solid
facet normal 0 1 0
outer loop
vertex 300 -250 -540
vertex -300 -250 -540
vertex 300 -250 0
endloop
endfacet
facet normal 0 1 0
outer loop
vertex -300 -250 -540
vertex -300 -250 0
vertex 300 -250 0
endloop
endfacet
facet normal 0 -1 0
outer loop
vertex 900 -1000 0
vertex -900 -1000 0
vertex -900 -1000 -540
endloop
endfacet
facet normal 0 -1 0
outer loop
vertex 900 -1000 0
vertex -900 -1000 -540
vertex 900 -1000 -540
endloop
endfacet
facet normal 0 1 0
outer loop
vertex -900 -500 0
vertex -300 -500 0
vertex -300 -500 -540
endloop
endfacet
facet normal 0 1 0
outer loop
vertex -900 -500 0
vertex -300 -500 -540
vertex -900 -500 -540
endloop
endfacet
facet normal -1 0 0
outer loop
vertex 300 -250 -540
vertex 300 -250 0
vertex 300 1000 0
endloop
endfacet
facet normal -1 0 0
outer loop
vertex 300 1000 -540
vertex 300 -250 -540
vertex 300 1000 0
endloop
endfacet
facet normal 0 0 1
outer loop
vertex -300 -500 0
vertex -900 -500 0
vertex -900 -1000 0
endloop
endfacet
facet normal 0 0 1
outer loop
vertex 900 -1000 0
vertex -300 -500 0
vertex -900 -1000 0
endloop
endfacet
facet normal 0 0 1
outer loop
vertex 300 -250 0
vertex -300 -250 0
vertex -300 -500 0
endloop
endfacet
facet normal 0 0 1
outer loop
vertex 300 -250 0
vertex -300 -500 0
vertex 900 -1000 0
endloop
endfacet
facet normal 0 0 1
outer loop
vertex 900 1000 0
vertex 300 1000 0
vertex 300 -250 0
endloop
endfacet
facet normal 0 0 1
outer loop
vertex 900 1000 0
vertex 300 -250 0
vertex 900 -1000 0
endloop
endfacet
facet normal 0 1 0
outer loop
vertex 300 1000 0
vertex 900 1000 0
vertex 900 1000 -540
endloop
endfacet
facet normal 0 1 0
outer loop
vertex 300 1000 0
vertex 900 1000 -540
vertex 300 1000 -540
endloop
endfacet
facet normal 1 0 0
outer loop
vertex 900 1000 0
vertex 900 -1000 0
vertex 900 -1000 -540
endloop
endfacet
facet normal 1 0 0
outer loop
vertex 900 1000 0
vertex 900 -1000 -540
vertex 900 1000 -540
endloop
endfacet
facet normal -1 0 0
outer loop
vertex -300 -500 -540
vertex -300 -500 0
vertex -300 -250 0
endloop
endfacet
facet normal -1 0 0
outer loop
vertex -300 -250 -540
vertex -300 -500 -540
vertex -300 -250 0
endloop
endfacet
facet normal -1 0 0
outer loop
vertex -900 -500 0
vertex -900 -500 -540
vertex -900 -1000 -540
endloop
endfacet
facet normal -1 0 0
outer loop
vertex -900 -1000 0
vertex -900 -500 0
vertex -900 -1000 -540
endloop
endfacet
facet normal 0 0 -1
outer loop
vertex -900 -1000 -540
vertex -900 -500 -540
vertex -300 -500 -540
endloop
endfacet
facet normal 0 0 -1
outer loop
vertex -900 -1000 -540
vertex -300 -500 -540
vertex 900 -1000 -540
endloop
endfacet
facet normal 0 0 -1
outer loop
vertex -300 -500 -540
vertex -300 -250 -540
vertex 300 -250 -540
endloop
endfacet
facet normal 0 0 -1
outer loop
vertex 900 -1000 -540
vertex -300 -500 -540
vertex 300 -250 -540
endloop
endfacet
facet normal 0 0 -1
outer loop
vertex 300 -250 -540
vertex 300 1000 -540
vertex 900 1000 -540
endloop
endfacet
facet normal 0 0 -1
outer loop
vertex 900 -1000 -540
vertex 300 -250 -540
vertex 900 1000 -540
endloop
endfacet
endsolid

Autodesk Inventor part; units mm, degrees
ref_plane "YZ Plane" through (0, 0, 0) normal (1, 0, 0) x (0, 1, 0)
ref_plane "XZ Plane" through (0, 0, 0) normal (0, 1, 0) x (-1, 0, 0)
ref_plane "XY Plane" through (0, 0, 0) normal (0, 0, 1) x (1, 0, 0)
sketch "Sketch1" plane through (0, 0, 0) normal (0, 0, 1) x (1, 0, 0)
  line L0 (-900, -1000) -> (900, -1000)
  line L1 (900, -1000) -> (900, 1000)
  line L2 (900, 1000) -> (-900, 1000)
  line L3 (-900, 1000) -> (-900, -1000)
  line L4 (-900, -1000) -> (900, 1000) construction
  line L5 (900, -1000) -> (-900, 1000) construction
  point P0 (0, 0)
  dimension "d0" = 1000
  dimension "d1" = 900
extrude "Extrusion1" add sketch "Sketch1" against normal blind 540
sketch "Sketch2" plane through (0, 0, 0) normal (0, 0, 1) x (1, 0, 0)
  line L0 (-900, -1000) -> (900, -1000) projected
  line L1 (900, -1000) -> (900, 1000) projected
  line L2 (900, 1000) -> (-900, 1000) projected
  line L3 (-900, 1000) -> (-900, -1000) projected
  line L4 (900, -1000) -> (-900, -1000) projected
  line L5 (-900, -1000) -> (-900, -500)
  line L6 (-900, -1000) -> (-900, 1000) projected
  line L7 (-300, -500) -> (-300, -250)
  line L8 (-300, -250) -> (300, -250)
  line L9 (300, -250) -> (300, 1000)
  line L10 (-900, 1000) -> (-900, -500)
  line L11 (-300, -500) -> (-900, -500)
  point P0 (0, 0)
  point P1 (-300, -1000)
  point P2 (300, -1000)
  dimension "d4" = 600
  dimension "d5" = 600
  dimension "d6" = 600
  dimension "d7" = 500
  dimension "d8" = 1200
  dimension "d9" = 750
  dimension "d10" = 1500
extrude "Extrusion2" cut sketch "Sketch2" against normal up to next contours L3 L2 L9 L8 L7 L11
properties part number "data" material "ABS Plastic"
